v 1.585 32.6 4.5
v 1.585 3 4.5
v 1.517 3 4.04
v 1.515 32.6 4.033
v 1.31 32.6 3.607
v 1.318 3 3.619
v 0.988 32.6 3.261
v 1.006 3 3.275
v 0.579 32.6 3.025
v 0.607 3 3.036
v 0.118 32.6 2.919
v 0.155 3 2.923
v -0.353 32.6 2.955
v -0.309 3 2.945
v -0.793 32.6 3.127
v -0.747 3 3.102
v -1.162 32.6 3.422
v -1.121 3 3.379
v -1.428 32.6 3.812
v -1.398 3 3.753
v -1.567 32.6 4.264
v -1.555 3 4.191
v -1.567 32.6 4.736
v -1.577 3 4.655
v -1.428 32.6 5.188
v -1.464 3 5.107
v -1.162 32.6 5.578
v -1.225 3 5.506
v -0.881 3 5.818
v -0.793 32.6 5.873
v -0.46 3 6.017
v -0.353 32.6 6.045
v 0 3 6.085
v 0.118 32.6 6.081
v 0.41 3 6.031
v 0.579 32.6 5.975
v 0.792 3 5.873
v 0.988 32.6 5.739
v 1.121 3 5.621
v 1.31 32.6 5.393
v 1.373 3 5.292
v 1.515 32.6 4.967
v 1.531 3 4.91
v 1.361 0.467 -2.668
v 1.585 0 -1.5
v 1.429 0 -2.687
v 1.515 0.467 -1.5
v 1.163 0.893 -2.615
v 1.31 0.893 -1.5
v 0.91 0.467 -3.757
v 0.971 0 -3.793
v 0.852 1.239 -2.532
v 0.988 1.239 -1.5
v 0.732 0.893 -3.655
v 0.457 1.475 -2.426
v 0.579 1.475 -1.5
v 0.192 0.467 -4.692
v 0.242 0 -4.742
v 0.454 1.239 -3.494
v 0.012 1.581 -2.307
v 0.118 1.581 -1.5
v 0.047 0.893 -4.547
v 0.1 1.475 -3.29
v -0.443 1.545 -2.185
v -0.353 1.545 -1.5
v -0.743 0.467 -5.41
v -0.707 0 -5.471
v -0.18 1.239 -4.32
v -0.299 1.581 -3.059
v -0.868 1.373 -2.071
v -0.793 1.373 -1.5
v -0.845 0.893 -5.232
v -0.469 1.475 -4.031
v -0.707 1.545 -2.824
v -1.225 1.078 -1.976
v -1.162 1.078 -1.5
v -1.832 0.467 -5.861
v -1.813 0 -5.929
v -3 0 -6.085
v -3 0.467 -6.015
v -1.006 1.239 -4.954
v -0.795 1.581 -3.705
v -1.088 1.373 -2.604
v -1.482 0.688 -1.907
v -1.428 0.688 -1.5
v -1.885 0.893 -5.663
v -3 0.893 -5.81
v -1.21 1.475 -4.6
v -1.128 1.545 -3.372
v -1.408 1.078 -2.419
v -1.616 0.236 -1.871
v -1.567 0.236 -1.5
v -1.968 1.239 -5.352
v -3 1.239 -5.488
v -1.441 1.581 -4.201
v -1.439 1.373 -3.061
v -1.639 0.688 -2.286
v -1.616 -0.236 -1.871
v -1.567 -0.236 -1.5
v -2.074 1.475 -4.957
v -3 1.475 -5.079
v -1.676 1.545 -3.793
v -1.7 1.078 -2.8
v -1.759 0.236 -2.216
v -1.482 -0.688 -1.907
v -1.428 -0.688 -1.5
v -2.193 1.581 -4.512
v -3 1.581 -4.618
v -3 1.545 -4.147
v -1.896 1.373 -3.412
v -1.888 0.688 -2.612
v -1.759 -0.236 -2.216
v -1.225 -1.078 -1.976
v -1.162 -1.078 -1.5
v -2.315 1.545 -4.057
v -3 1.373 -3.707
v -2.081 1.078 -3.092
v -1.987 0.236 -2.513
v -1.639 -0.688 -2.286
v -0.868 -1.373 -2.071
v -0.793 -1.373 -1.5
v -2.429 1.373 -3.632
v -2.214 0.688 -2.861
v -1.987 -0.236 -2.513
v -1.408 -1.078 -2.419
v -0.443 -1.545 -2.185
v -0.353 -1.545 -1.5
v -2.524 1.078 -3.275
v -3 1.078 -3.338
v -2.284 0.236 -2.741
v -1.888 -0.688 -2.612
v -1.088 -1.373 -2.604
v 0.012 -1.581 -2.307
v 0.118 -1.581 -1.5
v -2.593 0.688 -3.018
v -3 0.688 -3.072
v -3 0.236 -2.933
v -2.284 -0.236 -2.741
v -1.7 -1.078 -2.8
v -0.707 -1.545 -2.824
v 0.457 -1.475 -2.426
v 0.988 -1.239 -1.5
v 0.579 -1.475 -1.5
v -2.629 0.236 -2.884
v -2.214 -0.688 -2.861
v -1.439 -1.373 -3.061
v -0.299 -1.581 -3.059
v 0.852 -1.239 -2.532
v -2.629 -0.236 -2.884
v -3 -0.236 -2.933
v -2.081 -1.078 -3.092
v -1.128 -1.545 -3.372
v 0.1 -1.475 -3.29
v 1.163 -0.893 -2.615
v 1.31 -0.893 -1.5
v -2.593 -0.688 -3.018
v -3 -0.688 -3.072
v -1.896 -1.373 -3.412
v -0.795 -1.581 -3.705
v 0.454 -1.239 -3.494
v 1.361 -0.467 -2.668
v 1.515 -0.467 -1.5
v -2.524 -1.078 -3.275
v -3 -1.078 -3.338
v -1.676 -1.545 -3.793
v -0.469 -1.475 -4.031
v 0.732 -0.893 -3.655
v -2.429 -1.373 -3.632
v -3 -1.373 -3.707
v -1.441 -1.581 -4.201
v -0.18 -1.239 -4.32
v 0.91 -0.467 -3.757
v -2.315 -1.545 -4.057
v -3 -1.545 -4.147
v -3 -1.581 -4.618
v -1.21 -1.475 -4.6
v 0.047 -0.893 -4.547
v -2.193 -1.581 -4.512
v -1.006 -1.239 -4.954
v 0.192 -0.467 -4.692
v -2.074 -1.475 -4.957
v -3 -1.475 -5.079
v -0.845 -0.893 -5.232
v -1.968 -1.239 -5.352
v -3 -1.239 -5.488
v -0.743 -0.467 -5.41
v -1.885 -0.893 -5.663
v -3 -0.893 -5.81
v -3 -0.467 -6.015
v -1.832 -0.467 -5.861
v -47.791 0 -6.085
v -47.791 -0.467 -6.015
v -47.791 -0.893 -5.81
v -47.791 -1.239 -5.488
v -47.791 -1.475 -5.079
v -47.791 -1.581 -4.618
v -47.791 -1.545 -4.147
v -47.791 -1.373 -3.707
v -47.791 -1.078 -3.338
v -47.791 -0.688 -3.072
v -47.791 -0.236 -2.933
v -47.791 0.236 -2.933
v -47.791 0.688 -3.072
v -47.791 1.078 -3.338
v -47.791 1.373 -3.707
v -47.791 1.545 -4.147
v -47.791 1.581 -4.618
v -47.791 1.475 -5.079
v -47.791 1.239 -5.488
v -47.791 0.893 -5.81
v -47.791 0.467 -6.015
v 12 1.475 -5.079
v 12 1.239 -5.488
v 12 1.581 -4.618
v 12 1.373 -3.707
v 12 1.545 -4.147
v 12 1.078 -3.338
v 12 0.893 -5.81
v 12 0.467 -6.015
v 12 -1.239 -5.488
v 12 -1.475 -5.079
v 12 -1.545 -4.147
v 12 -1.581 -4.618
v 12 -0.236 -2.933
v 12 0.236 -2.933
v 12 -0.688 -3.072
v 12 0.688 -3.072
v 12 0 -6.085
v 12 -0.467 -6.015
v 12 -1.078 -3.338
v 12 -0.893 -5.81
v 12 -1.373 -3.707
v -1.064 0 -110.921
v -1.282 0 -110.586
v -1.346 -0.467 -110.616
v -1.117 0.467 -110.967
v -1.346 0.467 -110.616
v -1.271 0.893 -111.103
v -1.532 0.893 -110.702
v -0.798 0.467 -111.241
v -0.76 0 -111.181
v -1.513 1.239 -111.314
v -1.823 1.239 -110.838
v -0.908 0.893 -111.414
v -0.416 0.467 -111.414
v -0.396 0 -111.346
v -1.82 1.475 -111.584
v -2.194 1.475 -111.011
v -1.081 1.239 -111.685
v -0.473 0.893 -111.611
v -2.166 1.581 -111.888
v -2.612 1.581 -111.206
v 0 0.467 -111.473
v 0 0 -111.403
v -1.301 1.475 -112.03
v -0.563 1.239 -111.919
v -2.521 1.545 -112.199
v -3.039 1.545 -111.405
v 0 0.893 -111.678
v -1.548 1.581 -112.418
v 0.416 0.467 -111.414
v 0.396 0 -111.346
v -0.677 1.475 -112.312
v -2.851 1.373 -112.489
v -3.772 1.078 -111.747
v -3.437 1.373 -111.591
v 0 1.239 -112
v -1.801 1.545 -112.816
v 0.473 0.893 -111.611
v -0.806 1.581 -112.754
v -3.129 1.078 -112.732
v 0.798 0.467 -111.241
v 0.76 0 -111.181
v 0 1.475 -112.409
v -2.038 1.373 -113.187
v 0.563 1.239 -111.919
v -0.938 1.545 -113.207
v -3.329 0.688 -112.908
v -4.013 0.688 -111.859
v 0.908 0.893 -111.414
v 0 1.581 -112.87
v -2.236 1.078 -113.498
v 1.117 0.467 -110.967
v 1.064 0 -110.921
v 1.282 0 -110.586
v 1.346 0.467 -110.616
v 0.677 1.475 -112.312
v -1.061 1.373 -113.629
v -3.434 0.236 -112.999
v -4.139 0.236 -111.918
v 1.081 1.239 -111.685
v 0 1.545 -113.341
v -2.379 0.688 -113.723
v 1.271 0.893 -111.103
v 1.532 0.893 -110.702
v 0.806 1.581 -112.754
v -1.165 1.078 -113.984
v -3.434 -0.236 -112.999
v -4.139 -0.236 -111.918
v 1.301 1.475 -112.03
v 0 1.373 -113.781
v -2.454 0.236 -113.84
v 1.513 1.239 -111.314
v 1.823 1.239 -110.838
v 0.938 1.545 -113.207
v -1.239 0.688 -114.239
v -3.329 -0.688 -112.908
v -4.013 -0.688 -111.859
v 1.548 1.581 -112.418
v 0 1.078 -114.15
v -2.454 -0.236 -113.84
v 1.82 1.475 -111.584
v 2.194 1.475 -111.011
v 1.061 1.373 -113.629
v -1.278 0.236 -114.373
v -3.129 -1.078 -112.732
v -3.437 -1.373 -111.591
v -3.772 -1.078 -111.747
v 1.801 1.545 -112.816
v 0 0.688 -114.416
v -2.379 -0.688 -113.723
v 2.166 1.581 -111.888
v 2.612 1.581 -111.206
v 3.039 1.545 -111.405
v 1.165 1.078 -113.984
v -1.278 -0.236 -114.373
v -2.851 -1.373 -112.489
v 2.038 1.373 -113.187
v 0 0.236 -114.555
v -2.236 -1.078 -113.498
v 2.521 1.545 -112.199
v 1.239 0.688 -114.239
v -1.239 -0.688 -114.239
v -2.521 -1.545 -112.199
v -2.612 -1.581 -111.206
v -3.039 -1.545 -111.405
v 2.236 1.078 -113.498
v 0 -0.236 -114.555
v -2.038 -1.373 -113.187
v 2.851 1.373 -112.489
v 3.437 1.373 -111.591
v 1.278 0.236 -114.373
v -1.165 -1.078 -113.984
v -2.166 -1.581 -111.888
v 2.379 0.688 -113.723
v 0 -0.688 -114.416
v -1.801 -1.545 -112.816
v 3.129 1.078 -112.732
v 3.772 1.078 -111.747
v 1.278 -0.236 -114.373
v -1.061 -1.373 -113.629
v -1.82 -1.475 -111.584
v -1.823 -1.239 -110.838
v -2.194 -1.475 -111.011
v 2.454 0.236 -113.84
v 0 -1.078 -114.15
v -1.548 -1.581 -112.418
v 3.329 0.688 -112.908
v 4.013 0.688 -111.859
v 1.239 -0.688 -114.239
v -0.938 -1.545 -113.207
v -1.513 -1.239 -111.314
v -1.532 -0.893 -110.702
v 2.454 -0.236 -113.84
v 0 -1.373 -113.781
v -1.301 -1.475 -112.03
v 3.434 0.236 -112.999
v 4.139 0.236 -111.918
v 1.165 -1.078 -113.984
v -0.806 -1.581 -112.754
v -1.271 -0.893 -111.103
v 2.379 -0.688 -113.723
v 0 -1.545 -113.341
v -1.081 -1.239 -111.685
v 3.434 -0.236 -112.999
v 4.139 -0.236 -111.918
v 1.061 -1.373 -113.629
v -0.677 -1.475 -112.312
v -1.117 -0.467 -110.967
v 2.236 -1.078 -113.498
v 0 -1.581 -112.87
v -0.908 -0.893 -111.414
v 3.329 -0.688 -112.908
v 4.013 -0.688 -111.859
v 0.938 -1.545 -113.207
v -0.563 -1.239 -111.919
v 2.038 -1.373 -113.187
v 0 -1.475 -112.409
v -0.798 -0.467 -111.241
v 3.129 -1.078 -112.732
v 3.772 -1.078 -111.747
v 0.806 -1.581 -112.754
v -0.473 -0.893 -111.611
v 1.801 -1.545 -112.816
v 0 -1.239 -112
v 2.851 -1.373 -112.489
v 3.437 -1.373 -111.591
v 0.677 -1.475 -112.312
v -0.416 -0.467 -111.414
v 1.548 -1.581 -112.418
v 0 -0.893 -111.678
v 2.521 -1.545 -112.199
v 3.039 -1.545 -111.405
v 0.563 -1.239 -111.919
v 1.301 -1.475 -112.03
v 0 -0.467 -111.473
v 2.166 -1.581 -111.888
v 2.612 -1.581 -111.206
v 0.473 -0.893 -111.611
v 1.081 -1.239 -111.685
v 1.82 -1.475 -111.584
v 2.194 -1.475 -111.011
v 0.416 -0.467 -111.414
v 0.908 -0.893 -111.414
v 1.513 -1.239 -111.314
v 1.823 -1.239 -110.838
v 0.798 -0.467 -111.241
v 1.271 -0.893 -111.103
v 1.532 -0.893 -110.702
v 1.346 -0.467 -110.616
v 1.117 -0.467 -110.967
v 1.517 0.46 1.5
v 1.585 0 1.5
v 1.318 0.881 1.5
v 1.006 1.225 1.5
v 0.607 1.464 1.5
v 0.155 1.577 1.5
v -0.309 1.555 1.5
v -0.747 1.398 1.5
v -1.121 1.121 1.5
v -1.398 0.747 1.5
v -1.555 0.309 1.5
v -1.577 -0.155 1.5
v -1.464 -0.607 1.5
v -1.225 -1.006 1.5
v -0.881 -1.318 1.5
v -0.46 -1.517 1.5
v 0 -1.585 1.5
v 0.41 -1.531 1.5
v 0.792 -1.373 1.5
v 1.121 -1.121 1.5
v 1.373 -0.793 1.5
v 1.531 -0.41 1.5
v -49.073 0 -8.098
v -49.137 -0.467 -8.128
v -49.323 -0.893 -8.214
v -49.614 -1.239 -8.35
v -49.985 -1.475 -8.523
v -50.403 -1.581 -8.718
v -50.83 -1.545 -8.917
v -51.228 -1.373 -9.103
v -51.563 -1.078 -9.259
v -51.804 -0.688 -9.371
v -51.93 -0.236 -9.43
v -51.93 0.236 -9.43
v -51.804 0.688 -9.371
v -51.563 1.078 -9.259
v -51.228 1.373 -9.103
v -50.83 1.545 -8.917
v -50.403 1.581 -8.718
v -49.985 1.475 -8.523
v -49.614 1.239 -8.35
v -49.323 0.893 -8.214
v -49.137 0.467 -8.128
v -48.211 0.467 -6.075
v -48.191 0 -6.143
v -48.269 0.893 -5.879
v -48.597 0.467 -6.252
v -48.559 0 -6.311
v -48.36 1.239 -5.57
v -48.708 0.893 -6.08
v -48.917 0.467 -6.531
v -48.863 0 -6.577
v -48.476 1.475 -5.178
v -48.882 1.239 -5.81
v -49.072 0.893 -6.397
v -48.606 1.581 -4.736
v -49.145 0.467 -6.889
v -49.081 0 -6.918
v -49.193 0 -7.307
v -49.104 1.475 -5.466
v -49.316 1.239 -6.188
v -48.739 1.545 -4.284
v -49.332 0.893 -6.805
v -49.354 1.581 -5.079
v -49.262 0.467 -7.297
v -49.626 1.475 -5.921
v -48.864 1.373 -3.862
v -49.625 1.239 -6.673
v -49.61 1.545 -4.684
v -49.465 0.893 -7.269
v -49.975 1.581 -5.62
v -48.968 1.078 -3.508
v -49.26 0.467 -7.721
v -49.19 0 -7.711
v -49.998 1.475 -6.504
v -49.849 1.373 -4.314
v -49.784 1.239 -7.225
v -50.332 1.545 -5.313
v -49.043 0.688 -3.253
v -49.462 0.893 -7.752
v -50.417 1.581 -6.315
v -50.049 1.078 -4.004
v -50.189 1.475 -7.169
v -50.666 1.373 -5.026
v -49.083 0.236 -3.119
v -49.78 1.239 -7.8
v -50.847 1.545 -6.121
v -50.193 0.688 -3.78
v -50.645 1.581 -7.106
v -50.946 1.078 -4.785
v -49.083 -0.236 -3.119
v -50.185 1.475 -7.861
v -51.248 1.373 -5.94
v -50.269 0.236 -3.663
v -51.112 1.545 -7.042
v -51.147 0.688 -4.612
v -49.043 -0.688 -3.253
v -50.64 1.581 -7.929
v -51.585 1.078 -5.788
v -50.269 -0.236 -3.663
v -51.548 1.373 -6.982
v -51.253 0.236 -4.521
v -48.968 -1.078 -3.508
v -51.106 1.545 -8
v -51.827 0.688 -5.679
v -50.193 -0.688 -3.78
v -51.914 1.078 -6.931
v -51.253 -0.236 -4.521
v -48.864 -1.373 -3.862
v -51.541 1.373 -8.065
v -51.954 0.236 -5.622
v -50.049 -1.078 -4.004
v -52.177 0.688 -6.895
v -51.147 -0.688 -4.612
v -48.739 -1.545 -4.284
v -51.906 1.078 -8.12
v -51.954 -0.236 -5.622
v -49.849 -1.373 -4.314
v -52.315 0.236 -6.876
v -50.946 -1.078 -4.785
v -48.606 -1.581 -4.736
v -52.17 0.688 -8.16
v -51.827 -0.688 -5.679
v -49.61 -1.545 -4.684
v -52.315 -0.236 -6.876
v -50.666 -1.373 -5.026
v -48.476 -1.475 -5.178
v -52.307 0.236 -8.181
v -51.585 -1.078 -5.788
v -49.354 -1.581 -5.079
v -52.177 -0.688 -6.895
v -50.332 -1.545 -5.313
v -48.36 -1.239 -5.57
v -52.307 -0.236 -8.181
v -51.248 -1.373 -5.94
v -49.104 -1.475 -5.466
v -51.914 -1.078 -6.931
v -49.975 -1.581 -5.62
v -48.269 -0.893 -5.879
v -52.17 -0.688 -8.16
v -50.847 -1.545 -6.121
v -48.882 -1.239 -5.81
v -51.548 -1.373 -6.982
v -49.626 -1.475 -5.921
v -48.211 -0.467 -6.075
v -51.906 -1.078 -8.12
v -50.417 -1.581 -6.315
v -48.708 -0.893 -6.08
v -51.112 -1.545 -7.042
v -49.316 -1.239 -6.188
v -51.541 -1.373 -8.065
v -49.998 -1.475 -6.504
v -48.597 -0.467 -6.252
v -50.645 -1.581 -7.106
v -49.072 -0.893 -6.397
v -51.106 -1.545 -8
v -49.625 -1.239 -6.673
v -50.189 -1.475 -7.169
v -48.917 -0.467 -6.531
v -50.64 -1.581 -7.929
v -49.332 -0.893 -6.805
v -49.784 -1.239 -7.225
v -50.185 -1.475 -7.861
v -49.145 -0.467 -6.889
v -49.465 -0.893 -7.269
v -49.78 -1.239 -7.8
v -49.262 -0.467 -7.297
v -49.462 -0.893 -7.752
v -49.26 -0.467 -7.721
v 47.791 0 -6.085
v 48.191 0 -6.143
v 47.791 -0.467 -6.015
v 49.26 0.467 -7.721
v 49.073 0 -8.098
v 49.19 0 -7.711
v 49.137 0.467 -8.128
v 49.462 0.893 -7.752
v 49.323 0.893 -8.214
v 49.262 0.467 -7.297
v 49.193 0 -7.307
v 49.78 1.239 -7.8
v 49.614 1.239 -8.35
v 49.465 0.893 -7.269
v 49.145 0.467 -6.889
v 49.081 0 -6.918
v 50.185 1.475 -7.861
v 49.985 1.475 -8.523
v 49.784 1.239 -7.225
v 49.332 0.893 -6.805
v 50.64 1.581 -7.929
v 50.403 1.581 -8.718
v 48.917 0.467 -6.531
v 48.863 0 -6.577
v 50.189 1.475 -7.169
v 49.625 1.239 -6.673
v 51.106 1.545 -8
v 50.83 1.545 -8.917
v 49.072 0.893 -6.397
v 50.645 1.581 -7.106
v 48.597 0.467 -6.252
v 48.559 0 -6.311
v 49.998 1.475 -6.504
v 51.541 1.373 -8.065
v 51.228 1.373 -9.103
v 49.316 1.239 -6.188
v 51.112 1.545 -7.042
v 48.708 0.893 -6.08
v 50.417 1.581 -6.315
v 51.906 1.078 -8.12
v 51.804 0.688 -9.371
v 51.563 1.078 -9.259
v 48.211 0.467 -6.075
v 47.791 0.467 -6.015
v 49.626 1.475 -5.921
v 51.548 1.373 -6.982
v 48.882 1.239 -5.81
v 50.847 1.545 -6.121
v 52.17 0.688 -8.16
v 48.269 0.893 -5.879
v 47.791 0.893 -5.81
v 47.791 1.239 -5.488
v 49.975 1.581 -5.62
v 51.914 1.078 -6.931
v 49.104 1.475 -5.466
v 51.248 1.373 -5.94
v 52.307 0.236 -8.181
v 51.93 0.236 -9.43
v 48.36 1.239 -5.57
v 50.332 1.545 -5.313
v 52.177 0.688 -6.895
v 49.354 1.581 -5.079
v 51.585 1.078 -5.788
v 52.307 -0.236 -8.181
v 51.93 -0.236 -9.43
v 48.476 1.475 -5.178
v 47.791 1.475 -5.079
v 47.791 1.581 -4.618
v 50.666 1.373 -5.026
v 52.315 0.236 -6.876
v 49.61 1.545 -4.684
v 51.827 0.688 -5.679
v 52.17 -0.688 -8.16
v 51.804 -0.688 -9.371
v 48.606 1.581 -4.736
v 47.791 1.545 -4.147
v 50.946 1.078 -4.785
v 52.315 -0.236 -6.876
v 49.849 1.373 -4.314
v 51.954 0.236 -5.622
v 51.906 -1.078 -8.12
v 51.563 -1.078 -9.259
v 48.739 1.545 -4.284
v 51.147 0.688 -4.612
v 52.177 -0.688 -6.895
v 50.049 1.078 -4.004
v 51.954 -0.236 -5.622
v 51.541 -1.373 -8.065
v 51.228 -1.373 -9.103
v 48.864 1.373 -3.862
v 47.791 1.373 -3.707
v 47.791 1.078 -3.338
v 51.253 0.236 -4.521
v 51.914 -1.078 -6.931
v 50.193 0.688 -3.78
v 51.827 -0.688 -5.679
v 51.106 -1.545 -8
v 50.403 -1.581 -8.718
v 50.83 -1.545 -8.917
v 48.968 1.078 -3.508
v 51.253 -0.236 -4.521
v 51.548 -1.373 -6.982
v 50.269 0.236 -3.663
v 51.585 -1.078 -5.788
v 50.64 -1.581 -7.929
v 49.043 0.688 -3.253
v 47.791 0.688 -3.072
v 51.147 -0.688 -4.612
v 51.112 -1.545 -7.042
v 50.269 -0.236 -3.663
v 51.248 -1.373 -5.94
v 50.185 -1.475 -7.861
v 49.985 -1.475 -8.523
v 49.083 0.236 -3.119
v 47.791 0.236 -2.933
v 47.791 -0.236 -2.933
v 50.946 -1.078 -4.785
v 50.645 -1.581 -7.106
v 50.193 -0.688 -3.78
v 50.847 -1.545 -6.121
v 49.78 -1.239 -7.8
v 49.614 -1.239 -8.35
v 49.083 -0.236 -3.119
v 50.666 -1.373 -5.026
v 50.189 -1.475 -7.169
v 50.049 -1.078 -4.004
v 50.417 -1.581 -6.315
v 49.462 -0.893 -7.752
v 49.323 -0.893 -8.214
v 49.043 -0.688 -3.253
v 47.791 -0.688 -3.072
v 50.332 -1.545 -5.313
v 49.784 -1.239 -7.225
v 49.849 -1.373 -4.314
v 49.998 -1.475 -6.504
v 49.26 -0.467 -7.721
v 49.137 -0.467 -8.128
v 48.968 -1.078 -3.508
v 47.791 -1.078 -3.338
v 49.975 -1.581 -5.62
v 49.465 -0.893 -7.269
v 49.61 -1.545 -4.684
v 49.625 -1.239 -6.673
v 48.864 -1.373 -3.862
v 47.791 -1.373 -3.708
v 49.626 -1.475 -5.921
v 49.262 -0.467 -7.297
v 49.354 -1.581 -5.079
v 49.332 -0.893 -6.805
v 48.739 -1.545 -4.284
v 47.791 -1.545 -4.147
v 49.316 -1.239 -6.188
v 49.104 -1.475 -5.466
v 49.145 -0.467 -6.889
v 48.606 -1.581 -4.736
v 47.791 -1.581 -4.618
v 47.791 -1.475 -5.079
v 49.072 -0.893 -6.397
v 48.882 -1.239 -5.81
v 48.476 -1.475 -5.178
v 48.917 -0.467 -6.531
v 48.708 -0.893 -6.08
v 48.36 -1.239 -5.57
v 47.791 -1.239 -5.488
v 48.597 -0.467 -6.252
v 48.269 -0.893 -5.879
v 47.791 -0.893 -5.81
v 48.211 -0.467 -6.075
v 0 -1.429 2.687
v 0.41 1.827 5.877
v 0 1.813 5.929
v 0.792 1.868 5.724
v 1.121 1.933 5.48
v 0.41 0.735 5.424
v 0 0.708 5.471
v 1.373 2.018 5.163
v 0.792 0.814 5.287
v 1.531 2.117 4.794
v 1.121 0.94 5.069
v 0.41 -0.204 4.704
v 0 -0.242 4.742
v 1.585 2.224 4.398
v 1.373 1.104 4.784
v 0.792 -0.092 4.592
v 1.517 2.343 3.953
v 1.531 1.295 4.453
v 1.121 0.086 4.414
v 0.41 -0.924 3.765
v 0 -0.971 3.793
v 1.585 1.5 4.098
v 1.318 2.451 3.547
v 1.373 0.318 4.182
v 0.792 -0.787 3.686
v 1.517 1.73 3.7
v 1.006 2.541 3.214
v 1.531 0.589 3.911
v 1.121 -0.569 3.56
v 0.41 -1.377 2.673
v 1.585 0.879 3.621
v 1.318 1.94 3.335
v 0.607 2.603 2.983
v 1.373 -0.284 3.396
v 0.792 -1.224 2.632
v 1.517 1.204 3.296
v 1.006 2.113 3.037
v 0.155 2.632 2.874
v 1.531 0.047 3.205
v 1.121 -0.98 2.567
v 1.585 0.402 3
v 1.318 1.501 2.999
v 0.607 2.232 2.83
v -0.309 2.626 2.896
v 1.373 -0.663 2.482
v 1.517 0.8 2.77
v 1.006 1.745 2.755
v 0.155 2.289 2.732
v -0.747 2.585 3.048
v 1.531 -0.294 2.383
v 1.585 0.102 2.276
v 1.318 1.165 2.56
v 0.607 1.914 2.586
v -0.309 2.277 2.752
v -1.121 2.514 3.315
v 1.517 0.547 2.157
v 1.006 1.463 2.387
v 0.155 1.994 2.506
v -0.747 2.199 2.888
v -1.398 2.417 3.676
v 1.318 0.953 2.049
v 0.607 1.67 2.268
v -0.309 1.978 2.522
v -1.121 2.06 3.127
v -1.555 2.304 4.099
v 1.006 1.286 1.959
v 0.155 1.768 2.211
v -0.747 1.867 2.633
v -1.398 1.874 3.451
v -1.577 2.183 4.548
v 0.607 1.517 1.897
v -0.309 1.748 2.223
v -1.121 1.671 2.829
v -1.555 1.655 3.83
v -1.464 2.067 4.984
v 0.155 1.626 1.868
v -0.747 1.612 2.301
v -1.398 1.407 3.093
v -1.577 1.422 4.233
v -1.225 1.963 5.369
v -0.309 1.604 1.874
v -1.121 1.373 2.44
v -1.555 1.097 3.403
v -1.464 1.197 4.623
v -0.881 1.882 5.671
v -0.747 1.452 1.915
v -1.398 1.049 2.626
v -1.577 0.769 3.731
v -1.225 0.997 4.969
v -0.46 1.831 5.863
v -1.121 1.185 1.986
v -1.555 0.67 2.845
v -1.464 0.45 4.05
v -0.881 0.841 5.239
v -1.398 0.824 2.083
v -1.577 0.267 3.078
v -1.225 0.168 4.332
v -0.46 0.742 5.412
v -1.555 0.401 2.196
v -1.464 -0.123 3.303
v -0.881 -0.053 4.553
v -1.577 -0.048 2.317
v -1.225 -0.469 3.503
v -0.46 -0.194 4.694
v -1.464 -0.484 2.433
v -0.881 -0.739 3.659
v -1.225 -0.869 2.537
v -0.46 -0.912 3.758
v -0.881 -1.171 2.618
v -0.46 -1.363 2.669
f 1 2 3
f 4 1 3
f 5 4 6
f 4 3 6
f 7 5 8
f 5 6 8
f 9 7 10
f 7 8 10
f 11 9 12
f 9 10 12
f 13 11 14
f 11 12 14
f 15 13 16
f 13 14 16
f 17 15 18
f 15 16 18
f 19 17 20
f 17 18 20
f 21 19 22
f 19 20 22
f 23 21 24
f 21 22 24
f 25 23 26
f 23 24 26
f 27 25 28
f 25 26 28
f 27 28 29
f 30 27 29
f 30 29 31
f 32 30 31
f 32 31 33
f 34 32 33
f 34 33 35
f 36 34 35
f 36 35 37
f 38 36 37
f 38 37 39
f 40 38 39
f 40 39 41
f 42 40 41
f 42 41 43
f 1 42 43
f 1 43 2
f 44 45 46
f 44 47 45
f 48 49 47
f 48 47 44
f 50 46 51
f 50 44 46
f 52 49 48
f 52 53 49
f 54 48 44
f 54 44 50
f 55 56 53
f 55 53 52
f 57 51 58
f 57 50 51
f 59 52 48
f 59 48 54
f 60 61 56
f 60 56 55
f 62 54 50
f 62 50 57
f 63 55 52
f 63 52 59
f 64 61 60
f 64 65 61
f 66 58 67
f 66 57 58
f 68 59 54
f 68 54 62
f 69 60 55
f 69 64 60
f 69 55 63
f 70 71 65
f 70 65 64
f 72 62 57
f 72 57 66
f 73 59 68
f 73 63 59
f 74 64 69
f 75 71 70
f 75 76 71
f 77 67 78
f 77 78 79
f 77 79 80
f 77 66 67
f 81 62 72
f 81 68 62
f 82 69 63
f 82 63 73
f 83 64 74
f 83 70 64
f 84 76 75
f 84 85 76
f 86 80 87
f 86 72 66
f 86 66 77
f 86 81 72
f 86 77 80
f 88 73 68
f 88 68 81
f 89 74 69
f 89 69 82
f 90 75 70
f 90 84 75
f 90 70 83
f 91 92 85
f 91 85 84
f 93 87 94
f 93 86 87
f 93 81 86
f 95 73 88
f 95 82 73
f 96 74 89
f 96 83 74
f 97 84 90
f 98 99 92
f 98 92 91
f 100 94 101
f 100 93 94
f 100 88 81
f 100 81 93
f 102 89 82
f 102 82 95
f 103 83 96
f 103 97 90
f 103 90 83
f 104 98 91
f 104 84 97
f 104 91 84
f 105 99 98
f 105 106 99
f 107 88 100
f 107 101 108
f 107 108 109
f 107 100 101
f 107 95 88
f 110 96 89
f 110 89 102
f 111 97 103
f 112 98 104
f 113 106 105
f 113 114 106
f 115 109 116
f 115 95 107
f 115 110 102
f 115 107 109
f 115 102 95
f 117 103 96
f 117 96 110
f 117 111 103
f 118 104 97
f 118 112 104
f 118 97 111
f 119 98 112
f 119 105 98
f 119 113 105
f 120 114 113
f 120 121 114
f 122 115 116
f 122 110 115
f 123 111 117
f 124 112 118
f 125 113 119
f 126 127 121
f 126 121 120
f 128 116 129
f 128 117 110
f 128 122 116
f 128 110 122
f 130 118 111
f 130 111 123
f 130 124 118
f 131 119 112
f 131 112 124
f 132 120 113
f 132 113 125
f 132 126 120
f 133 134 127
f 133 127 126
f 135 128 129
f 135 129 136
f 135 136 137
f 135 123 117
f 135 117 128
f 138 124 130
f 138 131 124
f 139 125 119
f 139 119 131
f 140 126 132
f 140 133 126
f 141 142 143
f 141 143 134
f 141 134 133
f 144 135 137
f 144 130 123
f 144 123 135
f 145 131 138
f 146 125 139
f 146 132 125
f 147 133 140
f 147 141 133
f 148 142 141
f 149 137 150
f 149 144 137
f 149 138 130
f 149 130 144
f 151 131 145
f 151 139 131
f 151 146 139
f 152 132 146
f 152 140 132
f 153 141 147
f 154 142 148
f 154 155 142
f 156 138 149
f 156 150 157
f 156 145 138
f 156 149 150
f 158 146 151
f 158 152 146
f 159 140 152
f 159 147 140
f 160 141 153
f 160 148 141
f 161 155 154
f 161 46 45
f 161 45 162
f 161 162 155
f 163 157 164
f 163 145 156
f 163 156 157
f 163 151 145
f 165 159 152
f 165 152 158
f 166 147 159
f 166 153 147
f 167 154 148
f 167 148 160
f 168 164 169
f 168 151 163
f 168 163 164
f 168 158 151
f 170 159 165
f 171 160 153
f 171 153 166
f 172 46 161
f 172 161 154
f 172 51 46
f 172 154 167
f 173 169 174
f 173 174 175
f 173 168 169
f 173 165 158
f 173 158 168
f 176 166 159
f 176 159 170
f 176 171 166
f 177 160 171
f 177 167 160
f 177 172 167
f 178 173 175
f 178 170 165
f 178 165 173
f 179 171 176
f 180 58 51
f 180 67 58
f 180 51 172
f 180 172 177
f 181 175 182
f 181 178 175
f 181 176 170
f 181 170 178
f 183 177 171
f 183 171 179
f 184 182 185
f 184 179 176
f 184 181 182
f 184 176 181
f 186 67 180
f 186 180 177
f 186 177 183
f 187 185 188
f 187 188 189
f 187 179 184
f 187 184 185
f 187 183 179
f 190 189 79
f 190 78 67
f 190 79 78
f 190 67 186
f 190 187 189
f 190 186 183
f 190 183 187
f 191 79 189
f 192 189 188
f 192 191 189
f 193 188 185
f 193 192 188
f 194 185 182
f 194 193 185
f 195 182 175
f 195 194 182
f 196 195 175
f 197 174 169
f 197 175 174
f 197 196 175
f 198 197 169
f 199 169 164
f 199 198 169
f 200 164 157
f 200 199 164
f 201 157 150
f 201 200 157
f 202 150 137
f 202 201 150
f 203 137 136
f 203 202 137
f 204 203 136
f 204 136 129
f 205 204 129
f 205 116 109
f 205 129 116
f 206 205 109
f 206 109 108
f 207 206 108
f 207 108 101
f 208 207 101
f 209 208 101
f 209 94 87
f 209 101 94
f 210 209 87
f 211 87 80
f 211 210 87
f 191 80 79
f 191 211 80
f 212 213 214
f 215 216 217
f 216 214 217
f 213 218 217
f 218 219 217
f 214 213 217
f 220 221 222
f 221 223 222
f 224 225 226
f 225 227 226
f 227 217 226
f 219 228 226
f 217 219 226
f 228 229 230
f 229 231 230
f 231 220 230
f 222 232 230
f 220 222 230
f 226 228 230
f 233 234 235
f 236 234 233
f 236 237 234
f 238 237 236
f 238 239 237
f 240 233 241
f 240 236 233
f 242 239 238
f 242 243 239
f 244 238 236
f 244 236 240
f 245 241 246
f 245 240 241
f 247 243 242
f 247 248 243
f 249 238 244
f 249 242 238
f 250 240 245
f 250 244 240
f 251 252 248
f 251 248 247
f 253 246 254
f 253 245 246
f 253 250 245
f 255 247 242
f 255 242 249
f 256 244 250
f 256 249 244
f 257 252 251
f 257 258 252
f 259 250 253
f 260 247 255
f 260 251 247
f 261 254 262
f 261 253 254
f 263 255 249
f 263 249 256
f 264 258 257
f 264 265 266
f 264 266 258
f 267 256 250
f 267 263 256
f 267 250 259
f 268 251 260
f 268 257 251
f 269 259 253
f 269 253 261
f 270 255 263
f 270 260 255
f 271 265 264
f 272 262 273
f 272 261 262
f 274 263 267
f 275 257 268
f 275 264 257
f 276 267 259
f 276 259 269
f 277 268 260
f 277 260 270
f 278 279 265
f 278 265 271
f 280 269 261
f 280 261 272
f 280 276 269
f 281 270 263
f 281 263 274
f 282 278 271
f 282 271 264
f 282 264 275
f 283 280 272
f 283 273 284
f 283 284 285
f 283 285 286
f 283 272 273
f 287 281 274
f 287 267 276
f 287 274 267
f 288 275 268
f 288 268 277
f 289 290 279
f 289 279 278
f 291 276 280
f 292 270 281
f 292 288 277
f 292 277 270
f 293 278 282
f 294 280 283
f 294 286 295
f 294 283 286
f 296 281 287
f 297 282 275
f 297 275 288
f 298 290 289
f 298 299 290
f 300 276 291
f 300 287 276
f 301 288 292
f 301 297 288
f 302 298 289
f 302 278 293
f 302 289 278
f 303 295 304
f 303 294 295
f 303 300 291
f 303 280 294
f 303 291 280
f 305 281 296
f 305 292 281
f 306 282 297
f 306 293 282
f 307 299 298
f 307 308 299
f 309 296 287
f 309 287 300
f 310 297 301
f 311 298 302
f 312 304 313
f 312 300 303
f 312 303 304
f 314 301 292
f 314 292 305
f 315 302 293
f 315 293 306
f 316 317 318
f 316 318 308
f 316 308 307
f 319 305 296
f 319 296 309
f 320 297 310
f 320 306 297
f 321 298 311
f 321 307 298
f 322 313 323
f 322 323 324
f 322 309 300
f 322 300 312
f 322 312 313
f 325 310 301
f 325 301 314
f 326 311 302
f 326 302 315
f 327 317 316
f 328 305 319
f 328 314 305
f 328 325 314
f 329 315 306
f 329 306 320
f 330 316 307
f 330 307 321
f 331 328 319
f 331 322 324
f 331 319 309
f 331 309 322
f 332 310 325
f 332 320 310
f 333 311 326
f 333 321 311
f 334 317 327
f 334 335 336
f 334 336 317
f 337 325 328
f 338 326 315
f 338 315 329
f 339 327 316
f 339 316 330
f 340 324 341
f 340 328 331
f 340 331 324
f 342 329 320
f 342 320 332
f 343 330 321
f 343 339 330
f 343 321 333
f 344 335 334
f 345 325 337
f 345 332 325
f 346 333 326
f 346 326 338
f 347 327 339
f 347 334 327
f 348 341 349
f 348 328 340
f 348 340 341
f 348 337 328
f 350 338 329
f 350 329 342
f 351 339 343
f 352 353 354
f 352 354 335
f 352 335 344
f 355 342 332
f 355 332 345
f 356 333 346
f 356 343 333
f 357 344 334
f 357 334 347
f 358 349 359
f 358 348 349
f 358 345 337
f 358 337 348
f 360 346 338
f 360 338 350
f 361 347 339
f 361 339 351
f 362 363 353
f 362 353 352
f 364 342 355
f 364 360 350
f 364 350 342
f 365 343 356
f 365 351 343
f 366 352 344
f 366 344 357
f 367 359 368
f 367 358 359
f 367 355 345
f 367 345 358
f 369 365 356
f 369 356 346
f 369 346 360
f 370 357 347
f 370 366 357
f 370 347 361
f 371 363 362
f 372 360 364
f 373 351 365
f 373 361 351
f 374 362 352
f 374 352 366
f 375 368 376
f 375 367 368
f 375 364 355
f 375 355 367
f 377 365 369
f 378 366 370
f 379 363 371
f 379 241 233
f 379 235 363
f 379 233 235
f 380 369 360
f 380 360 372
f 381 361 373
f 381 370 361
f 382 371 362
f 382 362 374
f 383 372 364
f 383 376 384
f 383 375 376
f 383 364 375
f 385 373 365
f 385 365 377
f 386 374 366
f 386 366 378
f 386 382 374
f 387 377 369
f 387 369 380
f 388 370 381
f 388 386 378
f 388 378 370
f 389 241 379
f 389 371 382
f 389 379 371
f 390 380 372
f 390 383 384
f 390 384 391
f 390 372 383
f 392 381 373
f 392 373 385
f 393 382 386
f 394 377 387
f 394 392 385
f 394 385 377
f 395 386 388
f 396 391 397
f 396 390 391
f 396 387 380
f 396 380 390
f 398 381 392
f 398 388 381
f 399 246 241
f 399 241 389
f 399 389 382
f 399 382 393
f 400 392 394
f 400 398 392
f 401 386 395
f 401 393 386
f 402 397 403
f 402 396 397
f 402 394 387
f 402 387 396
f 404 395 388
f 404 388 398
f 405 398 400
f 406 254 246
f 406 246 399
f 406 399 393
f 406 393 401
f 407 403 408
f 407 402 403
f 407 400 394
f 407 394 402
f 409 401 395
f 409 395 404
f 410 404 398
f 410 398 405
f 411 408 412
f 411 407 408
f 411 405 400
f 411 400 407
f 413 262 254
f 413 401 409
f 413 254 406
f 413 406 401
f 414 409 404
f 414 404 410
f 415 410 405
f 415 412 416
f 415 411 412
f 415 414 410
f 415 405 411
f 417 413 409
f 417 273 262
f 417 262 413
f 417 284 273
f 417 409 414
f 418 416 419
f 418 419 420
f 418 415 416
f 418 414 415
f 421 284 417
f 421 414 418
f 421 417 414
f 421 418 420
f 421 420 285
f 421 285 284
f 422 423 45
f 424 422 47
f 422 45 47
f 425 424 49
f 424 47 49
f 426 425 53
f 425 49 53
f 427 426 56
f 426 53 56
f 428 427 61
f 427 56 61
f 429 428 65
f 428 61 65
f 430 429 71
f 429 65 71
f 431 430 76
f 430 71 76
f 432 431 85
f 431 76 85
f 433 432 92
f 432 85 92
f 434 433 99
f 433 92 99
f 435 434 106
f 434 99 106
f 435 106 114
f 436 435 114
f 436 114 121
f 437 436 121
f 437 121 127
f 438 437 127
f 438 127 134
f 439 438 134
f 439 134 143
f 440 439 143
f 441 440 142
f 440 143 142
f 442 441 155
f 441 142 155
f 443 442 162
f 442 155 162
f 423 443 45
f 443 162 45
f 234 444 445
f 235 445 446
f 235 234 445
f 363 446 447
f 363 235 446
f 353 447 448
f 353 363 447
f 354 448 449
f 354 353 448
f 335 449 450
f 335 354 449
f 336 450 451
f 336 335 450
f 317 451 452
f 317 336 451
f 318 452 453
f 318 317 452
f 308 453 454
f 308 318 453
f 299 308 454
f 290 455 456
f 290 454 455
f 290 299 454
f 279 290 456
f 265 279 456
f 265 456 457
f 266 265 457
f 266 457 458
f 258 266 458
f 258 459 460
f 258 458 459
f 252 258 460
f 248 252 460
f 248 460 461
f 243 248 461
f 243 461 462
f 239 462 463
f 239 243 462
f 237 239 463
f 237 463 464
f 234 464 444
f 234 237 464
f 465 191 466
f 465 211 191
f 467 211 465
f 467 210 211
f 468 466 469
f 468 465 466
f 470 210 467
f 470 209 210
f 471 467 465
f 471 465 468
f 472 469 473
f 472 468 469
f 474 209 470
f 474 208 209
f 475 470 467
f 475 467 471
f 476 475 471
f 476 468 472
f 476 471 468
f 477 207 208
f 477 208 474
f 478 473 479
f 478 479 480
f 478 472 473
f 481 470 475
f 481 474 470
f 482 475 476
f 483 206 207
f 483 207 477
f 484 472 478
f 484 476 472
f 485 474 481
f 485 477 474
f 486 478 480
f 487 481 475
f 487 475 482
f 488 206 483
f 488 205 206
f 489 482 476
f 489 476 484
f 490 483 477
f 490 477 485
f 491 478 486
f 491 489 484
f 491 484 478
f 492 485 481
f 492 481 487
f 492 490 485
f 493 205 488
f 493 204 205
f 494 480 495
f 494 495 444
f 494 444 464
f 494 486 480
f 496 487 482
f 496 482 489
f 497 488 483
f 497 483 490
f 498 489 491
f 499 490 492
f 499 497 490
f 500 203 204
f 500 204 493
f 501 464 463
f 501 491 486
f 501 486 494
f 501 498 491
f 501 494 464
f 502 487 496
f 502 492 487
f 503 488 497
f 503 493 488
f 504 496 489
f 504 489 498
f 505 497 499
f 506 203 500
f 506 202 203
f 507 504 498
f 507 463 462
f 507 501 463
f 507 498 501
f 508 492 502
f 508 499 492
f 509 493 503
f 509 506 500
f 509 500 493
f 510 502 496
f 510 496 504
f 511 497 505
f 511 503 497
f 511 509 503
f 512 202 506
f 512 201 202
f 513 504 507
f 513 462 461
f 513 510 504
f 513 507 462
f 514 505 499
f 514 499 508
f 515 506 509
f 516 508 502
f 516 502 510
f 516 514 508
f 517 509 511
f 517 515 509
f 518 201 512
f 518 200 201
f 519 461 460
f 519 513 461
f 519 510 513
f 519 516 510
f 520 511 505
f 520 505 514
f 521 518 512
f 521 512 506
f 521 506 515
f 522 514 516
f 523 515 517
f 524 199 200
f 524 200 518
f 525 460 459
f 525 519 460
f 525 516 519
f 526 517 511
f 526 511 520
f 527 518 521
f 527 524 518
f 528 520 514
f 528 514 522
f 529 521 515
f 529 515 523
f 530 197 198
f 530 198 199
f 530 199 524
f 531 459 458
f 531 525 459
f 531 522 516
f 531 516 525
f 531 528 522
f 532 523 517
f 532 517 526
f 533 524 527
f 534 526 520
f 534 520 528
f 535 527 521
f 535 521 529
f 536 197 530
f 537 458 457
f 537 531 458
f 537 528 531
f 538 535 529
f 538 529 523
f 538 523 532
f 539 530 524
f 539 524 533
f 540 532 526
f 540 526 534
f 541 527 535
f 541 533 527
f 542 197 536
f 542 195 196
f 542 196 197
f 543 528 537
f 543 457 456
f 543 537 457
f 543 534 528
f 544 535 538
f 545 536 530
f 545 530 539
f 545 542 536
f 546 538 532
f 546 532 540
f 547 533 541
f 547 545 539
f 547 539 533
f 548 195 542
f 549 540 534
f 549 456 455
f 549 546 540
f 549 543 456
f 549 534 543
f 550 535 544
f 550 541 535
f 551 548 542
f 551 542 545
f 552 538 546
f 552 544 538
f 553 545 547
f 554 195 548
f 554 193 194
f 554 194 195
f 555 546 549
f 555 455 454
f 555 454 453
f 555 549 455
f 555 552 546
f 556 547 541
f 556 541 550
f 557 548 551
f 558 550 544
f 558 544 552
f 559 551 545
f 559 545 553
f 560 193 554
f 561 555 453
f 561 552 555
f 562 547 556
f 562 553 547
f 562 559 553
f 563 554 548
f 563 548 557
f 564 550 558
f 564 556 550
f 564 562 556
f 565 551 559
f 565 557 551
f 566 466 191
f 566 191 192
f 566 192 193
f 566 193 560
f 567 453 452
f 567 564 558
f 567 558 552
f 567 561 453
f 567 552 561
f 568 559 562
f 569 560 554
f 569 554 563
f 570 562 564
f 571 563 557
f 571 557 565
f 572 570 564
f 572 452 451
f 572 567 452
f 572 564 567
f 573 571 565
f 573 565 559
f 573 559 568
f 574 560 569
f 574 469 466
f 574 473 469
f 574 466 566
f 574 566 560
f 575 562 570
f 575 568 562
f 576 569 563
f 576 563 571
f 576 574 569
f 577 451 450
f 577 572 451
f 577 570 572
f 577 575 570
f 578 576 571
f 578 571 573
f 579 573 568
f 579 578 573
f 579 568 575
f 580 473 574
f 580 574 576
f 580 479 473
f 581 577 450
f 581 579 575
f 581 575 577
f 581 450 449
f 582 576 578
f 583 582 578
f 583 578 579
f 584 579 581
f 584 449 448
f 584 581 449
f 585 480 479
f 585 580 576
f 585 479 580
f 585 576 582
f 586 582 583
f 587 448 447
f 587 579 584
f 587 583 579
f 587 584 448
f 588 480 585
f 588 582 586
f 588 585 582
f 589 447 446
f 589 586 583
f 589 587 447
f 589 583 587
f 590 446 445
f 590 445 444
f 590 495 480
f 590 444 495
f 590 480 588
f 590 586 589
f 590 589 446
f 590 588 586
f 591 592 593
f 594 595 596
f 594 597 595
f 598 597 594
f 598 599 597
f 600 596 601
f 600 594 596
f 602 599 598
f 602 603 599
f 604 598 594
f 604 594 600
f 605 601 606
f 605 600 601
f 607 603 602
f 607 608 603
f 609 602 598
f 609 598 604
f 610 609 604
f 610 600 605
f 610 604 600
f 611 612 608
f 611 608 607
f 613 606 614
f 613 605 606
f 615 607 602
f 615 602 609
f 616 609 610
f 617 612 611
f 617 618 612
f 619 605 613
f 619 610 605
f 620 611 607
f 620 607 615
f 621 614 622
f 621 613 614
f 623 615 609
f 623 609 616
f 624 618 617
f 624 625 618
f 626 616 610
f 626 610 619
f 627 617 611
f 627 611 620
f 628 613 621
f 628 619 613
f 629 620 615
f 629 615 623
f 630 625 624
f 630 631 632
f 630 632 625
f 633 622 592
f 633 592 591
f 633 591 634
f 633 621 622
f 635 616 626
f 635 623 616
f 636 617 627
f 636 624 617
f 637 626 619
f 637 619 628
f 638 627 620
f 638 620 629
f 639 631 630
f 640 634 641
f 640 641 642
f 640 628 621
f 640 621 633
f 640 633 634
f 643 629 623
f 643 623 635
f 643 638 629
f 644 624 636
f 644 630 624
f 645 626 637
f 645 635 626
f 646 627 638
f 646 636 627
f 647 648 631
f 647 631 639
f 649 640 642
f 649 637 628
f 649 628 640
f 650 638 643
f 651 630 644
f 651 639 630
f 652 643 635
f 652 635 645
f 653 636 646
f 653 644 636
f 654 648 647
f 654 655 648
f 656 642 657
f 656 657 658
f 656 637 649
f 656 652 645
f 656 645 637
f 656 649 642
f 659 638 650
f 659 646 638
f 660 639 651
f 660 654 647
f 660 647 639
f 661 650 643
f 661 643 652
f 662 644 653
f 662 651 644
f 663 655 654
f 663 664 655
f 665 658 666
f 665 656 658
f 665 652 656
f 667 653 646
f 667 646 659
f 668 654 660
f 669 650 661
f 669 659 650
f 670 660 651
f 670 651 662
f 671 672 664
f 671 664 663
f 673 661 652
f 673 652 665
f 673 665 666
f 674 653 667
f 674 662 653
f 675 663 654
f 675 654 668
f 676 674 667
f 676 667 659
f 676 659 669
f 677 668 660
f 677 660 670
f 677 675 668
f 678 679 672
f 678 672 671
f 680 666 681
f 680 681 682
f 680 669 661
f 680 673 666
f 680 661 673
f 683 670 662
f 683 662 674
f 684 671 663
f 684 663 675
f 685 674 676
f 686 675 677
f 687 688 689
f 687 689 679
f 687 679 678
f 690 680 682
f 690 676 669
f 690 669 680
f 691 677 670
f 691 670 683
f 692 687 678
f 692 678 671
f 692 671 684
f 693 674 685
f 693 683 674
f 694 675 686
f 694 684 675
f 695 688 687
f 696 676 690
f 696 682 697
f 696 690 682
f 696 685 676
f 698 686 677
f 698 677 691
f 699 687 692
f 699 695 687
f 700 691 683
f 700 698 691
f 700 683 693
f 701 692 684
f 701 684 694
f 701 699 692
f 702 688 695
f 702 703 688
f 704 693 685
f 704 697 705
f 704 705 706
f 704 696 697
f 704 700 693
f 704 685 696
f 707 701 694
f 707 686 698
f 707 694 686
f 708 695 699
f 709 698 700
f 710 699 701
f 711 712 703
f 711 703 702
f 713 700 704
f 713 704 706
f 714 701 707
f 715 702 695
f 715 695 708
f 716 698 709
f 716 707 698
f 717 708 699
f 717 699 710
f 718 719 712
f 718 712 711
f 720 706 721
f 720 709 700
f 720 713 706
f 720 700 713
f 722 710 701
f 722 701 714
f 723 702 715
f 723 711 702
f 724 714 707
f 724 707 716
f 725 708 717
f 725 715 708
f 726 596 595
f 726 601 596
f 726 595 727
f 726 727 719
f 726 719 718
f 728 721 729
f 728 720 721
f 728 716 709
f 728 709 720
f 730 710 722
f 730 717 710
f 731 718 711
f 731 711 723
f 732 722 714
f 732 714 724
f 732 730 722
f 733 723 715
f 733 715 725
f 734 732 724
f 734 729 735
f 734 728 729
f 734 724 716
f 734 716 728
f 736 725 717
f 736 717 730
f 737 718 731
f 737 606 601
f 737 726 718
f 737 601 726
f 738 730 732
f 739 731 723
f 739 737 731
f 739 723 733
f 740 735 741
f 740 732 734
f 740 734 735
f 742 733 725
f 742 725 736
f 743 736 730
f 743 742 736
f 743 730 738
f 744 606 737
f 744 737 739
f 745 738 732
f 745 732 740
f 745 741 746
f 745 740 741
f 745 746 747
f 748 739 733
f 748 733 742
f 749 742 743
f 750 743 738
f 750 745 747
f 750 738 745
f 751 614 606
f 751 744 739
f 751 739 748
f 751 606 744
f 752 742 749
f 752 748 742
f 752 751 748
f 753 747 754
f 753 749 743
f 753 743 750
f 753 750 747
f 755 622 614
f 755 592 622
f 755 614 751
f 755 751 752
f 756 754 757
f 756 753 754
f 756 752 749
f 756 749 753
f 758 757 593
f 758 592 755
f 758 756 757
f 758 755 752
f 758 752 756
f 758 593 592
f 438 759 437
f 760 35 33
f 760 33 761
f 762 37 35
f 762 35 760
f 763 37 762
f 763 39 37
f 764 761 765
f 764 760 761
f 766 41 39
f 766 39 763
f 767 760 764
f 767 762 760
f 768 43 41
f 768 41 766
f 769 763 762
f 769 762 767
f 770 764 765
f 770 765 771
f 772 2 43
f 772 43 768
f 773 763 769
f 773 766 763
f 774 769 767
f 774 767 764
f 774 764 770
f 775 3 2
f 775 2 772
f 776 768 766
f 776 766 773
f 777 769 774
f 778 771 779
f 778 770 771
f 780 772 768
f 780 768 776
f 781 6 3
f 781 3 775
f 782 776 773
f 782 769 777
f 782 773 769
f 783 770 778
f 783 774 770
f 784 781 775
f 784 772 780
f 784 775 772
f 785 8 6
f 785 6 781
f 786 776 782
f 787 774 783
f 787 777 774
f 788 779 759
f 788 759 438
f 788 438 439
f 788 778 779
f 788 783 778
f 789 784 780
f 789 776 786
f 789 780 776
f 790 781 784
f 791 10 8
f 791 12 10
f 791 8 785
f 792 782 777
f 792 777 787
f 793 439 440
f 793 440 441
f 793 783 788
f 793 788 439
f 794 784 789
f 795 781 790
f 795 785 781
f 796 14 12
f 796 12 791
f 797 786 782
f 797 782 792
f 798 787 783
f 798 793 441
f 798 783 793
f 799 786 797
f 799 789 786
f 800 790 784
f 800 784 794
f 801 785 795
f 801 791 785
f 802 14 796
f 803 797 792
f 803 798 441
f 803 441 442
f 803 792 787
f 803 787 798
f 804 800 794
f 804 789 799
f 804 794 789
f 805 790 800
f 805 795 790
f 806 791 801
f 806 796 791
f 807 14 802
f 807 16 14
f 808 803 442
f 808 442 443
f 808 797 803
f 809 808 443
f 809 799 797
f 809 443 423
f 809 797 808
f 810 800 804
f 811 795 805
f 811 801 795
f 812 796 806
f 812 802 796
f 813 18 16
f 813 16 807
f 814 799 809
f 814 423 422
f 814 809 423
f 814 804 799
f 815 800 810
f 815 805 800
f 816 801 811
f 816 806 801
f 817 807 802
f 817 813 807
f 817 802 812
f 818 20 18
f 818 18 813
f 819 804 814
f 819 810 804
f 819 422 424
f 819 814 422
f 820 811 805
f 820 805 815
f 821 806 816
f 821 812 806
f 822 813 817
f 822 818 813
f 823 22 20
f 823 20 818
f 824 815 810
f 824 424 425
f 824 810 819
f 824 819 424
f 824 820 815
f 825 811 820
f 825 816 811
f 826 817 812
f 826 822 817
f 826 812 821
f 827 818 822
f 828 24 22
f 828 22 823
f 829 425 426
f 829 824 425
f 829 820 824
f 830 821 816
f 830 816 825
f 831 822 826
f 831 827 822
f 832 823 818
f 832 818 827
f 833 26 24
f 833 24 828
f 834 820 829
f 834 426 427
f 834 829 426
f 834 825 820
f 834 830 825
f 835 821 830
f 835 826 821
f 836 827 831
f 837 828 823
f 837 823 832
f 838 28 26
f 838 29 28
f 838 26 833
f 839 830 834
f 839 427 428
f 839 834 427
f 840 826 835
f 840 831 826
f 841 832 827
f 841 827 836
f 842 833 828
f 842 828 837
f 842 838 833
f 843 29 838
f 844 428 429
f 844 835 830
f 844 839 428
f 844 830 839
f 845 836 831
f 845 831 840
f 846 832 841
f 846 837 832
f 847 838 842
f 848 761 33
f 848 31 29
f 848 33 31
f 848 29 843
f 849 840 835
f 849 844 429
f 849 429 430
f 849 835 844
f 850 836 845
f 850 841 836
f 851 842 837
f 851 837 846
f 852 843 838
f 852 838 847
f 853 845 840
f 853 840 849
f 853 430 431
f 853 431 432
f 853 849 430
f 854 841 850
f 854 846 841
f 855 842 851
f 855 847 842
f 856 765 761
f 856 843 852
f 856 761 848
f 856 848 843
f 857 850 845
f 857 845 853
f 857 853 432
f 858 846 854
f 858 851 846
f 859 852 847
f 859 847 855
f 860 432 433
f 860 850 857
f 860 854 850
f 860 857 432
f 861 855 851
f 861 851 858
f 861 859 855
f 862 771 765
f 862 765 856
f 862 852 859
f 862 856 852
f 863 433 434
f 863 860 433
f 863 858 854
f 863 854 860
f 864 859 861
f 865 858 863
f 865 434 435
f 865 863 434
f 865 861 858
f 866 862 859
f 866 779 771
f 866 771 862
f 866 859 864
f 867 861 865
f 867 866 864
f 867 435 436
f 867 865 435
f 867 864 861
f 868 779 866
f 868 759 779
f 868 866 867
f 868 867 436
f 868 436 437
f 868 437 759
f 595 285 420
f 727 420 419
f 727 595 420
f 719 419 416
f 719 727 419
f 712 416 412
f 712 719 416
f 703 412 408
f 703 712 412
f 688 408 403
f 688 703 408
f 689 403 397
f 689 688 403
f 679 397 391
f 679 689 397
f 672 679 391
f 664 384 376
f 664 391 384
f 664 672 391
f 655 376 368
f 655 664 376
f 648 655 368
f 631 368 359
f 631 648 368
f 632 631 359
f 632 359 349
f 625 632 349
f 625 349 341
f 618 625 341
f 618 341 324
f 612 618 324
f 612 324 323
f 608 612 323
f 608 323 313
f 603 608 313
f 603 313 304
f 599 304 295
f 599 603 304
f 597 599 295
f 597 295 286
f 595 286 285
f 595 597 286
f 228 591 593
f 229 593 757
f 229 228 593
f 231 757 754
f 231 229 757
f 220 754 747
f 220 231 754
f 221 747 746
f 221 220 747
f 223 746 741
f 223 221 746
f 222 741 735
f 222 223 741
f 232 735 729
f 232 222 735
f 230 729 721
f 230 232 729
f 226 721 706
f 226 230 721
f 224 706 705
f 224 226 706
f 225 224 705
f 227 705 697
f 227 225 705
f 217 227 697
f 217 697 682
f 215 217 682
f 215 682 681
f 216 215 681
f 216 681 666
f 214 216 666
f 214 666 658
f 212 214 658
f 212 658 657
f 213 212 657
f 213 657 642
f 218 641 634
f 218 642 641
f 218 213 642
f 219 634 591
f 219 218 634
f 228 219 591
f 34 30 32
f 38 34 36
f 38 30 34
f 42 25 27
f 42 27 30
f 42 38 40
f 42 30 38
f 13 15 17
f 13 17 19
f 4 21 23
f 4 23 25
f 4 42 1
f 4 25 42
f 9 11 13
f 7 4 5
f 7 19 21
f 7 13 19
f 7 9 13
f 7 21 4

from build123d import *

# Parameters (mm, degrees)
ESBO_O7_R              = 1.585
VARREDURA4_OUTLINE_R   = 1.585
VARREDURA4_ANGLE       = 90
VARREDURA4_START       = -1.5000001
VARREDURA4_2_OUTLINE_R = 1.585
VARREDURA4_2_DEPTH     = 3.0000002
VARREDURA4_START_2     = 2.9999999
VARREDURA4_3_OUTLINE_R = 1.585
VARREDURA4_3_DEPTH     = 29.6000001


with BuildPart() as part:
    # Varredura3: sweep along a path in Esboço1
    with BuildLine(Plane(origin=(0, 0, 0), x_dir=(1, 0, 0), z_dir=(0, 1, 0))) as varredura3_path:
        Line((0, 0), (0, 1.5))
        ThreePointArc((0, 1.5), (-0.878679656, 3.621320344), (-3, 4.5))
        Line((-3, 4.5), (-47.790943269, 4.5))
        ThreePointArc((-47.790943269, 4.5), (-50.321117606, 5.888101175), (-50.50986663, 8.767854785))
        Line((-50.50986663, 8.767854785), (-2.718923361, 111.255863363))
        ThreePointArc((-2.718923361, 111.255863363), (0, 112.988008577), (2.718923361, 111.255863363))
        Line((2.718923361, 111.255863363), (50.50986663, 8.767854785))
        ThreePointArc((50.50986663, 8.767854785), (50.321117606, 5.888101175), (47.790943269, 4.5))
        Line((47.790943269, 4.5), (12, 4.5))
    # Esboço7 → Varredura3 (sweep)
    with BuildSketch(Plane.XY):
        Circle(ESBO_O7_R)
    sweep(path=varredura3_path.line)



with BuildPart() as body_2:
    # Varredura4: read off the stored shape, not the designer's step
    # Varredura4 outline → Varredura4 (revolve)
    with BuildSketch(Plane(origin=(0, 3, 1.5), x_dir=(0, 0, 1), z_dir=(0, 1, 0))):
        with Locations((3, 0)):
            Circle(VARREDURA4_OUTLINE_R)
    revolve(axis=Axis((0, 3, 1.5), (1, 0, 0)), revolution_arc=VARREDURA4_ANGLE)


with BuildPart() as part_1:
    add(part.part)

    add(body_2.part)  # Varredura4 2 merges body 2
    # Varredura4 2 outline → Varredura4 2 (add)
    with BuildSketch(Plane.XY.offset(VARREDURA4_START)):
        Circle(VARREDURA4_2_OUTLINE_R)
    extrude(amount=VARREDURA4_2_DEPTH)

    # Varredura4 3 outline → Varredura4 3 (add)
    with BuildSketch(Plane(origin=(0, 0, 0), x_dir=(1, 0, 0), z_dir=(0, 1, 0)).offset(VARREDURA4_START_2)):
        with Locations((0, -4.5)):
            Circle(VARREDURA4_3_OUTLINE_R)
    extrude(amount=VARREDURA4_3_DEPTH)


solid = part_1.part
